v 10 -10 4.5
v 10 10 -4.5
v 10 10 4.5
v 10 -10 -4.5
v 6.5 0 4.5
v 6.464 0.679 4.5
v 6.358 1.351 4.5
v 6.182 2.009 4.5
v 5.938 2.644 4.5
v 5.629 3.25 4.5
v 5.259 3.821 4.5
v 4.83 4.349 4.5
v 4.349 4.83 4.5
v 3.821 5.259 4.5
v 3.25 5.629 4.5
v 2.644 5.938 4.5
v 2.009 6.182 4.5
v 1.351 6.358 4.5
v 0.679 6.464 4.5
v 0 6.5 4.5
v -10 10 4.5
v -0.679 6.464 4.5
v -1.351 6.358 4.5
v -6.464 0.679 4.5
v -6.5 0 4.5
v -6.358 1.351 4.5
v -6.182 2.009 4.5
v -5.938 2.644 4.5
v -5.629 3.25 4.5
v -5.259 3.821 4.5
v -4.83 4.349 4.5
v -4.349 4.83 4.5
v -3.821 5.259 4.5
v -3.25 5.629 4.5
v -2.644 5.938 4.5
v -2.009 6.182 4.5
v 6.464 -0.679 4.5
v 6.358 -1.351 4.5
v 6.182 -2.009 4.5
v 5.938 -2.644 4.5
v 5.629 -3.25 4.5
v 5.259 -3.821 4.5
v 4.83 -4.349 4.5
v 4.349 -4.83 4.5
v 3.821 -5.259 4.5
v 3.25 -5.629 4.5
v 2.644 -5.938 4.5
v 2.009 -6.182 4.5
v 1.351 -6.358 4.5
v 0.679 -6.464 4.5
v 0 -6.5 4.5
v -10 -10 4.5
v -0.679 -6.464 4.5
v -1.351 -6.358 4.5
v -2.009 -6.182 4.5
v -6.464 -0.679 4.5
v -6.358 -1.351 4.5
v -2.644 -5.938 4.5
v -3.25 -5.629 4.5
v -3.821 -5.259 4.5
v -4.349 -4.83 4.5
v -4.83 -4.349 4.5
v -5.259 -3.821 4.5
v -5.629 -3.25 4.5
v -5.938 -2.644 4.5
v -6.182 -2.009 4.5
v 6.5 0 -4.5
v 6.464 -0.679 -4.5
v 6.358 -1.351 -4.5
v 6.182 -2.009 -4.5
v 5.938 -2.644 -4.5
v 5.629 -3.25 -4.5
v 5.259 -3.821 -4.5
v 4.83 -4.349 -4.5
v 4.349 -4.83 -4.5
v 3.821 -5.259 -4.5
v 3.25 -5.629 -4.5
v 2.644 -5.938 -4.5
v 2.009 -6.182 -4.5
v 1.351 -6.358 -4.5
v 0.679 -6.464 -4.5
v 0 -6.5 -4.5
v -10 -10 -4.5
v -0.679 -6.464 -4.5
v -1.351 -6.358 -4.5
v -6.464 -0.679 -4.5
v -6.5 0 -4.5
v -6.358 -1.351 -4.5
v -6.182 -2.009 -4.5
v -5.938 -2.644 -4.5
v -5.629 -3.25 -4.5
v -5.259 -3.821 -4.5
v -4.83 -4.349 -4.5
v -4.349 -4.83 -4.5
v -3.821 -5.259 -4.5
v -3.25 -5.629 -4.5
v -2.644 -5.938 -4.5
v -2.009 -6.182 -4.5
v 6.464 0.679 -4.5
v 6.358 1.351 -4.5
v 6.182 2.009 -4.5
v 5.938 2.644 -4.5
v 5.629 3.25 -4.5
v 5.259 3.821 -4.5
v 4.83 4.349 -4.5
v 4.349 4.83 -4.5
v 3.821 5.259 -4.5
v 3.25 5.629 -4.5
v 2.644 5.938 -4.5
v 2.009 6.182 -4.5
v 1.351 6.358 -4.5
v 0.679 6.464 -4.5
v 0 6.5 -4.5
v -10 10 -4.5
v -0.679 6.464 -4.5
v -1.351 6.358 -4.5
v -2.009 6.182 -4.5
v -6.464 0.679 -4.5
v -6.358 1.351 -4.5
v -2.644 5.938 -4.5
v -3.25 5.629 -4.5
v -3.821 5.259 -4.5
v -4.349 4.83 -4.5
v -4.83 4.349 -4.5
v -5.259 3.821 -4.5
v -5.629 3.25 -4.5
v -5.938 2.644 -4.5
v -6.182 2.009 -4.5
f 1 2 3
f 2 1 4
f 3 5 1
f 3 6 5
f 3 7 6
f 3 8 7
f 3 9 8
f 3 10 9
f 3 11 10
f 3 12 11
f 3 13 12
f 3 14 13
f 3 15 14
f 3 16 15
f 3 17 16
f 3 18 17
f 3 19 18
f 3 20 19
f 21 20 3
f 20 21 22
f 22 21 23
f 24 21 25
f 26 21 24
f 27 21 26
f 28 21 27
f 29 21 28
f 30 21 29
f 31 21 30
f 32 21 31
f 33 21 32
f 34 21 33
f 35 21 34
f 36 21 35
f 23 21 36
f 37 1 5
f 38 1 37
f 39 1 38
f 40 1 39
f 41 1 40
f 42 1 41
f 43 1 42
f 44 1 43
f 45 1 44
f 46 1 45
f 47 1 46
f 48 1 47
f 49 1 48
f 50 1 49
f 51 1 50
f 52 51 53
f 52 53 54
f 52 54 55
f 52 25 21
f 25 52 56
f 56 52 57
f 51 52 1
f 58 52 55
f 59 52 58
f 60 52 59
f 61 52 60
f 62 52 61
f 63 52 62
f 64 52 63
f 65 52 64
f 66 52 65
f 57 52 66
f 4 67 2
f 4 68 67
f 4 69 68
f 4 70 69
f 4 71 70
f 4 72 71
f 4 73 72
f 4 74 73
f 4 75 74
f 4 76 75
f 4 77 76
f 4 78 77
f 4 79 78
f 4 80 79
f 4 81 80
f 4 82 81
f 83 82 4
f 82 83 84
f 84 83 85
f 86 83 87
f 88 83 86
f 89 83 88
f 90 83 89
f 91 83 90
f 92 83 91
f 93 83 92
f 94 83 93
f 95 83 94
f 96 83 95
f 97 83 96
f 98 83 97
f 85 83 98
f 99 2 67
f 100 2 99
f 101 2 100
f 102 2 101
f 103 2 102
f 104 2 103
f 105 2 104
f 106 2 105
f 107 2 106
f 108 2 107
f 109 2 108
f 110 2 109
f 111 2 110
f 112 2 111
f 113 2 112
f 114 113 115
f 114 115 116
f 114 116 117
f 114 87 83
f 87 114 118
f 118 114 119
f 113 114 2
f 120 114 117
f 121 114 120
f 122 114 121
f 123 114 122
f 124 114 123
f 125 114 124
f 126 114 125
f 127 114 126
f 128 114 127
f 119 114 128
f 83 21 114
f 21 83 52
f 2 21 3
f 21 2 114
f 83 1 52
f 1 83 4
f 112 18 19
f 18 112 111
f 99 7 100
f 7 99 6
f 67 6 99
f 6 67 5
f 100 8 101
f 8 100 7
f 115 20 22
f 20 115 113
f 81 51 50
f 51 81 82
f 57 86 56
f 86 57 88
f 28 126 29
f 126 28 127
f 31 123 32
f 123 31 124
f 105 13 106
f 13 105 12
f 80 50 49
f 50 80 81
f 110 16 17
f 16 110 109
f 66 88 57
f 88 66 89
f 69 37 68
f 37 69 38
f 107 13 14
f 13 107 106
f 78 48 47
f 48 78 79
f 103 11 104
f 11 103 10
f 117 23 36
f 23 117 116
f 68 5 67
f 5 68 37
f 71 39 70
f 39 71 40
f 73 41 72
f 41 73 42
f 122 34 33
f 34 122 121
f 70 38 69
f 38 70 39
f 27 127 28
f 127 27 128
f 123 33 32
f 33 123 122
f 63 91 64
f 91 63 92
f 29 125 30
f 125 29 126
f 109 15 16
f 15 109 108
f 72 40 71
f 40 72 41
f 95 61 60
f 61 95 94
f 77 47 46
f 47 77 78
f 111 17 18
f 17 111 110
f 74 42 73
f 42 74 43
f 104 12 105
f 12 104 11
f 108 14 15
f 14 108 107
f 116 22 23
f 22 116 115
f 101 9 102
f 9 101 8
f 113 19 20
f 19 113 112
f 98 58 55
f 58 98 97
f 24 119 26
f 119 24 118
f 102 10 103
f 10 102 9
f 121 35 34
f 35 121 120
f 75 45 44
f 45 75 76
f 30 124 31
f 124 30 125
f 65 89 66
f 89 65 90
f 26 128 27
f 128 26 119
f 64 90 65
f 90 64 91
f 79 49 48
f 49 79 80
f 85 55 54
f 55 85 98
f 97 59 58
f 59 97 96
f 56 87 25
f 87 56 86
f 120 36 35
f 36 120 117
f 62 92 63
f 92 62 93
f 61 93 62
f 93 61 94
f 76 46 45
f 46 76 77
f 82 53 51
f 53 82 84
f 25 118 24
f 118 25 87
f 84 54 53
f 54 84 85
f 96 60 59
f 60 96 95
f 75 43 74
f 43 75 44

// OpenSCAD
// Square nut.
$fn = 60;
eps = 0.02;
thread_d = 13;
side = 20;
thickness = 9;
difference() {
    cube([side, side, thickness], center = true);
    translate([0, 0, -thickness / 2 - eps]) cylinder(d = thread_d, h = thickness + 2 * eps);
}
